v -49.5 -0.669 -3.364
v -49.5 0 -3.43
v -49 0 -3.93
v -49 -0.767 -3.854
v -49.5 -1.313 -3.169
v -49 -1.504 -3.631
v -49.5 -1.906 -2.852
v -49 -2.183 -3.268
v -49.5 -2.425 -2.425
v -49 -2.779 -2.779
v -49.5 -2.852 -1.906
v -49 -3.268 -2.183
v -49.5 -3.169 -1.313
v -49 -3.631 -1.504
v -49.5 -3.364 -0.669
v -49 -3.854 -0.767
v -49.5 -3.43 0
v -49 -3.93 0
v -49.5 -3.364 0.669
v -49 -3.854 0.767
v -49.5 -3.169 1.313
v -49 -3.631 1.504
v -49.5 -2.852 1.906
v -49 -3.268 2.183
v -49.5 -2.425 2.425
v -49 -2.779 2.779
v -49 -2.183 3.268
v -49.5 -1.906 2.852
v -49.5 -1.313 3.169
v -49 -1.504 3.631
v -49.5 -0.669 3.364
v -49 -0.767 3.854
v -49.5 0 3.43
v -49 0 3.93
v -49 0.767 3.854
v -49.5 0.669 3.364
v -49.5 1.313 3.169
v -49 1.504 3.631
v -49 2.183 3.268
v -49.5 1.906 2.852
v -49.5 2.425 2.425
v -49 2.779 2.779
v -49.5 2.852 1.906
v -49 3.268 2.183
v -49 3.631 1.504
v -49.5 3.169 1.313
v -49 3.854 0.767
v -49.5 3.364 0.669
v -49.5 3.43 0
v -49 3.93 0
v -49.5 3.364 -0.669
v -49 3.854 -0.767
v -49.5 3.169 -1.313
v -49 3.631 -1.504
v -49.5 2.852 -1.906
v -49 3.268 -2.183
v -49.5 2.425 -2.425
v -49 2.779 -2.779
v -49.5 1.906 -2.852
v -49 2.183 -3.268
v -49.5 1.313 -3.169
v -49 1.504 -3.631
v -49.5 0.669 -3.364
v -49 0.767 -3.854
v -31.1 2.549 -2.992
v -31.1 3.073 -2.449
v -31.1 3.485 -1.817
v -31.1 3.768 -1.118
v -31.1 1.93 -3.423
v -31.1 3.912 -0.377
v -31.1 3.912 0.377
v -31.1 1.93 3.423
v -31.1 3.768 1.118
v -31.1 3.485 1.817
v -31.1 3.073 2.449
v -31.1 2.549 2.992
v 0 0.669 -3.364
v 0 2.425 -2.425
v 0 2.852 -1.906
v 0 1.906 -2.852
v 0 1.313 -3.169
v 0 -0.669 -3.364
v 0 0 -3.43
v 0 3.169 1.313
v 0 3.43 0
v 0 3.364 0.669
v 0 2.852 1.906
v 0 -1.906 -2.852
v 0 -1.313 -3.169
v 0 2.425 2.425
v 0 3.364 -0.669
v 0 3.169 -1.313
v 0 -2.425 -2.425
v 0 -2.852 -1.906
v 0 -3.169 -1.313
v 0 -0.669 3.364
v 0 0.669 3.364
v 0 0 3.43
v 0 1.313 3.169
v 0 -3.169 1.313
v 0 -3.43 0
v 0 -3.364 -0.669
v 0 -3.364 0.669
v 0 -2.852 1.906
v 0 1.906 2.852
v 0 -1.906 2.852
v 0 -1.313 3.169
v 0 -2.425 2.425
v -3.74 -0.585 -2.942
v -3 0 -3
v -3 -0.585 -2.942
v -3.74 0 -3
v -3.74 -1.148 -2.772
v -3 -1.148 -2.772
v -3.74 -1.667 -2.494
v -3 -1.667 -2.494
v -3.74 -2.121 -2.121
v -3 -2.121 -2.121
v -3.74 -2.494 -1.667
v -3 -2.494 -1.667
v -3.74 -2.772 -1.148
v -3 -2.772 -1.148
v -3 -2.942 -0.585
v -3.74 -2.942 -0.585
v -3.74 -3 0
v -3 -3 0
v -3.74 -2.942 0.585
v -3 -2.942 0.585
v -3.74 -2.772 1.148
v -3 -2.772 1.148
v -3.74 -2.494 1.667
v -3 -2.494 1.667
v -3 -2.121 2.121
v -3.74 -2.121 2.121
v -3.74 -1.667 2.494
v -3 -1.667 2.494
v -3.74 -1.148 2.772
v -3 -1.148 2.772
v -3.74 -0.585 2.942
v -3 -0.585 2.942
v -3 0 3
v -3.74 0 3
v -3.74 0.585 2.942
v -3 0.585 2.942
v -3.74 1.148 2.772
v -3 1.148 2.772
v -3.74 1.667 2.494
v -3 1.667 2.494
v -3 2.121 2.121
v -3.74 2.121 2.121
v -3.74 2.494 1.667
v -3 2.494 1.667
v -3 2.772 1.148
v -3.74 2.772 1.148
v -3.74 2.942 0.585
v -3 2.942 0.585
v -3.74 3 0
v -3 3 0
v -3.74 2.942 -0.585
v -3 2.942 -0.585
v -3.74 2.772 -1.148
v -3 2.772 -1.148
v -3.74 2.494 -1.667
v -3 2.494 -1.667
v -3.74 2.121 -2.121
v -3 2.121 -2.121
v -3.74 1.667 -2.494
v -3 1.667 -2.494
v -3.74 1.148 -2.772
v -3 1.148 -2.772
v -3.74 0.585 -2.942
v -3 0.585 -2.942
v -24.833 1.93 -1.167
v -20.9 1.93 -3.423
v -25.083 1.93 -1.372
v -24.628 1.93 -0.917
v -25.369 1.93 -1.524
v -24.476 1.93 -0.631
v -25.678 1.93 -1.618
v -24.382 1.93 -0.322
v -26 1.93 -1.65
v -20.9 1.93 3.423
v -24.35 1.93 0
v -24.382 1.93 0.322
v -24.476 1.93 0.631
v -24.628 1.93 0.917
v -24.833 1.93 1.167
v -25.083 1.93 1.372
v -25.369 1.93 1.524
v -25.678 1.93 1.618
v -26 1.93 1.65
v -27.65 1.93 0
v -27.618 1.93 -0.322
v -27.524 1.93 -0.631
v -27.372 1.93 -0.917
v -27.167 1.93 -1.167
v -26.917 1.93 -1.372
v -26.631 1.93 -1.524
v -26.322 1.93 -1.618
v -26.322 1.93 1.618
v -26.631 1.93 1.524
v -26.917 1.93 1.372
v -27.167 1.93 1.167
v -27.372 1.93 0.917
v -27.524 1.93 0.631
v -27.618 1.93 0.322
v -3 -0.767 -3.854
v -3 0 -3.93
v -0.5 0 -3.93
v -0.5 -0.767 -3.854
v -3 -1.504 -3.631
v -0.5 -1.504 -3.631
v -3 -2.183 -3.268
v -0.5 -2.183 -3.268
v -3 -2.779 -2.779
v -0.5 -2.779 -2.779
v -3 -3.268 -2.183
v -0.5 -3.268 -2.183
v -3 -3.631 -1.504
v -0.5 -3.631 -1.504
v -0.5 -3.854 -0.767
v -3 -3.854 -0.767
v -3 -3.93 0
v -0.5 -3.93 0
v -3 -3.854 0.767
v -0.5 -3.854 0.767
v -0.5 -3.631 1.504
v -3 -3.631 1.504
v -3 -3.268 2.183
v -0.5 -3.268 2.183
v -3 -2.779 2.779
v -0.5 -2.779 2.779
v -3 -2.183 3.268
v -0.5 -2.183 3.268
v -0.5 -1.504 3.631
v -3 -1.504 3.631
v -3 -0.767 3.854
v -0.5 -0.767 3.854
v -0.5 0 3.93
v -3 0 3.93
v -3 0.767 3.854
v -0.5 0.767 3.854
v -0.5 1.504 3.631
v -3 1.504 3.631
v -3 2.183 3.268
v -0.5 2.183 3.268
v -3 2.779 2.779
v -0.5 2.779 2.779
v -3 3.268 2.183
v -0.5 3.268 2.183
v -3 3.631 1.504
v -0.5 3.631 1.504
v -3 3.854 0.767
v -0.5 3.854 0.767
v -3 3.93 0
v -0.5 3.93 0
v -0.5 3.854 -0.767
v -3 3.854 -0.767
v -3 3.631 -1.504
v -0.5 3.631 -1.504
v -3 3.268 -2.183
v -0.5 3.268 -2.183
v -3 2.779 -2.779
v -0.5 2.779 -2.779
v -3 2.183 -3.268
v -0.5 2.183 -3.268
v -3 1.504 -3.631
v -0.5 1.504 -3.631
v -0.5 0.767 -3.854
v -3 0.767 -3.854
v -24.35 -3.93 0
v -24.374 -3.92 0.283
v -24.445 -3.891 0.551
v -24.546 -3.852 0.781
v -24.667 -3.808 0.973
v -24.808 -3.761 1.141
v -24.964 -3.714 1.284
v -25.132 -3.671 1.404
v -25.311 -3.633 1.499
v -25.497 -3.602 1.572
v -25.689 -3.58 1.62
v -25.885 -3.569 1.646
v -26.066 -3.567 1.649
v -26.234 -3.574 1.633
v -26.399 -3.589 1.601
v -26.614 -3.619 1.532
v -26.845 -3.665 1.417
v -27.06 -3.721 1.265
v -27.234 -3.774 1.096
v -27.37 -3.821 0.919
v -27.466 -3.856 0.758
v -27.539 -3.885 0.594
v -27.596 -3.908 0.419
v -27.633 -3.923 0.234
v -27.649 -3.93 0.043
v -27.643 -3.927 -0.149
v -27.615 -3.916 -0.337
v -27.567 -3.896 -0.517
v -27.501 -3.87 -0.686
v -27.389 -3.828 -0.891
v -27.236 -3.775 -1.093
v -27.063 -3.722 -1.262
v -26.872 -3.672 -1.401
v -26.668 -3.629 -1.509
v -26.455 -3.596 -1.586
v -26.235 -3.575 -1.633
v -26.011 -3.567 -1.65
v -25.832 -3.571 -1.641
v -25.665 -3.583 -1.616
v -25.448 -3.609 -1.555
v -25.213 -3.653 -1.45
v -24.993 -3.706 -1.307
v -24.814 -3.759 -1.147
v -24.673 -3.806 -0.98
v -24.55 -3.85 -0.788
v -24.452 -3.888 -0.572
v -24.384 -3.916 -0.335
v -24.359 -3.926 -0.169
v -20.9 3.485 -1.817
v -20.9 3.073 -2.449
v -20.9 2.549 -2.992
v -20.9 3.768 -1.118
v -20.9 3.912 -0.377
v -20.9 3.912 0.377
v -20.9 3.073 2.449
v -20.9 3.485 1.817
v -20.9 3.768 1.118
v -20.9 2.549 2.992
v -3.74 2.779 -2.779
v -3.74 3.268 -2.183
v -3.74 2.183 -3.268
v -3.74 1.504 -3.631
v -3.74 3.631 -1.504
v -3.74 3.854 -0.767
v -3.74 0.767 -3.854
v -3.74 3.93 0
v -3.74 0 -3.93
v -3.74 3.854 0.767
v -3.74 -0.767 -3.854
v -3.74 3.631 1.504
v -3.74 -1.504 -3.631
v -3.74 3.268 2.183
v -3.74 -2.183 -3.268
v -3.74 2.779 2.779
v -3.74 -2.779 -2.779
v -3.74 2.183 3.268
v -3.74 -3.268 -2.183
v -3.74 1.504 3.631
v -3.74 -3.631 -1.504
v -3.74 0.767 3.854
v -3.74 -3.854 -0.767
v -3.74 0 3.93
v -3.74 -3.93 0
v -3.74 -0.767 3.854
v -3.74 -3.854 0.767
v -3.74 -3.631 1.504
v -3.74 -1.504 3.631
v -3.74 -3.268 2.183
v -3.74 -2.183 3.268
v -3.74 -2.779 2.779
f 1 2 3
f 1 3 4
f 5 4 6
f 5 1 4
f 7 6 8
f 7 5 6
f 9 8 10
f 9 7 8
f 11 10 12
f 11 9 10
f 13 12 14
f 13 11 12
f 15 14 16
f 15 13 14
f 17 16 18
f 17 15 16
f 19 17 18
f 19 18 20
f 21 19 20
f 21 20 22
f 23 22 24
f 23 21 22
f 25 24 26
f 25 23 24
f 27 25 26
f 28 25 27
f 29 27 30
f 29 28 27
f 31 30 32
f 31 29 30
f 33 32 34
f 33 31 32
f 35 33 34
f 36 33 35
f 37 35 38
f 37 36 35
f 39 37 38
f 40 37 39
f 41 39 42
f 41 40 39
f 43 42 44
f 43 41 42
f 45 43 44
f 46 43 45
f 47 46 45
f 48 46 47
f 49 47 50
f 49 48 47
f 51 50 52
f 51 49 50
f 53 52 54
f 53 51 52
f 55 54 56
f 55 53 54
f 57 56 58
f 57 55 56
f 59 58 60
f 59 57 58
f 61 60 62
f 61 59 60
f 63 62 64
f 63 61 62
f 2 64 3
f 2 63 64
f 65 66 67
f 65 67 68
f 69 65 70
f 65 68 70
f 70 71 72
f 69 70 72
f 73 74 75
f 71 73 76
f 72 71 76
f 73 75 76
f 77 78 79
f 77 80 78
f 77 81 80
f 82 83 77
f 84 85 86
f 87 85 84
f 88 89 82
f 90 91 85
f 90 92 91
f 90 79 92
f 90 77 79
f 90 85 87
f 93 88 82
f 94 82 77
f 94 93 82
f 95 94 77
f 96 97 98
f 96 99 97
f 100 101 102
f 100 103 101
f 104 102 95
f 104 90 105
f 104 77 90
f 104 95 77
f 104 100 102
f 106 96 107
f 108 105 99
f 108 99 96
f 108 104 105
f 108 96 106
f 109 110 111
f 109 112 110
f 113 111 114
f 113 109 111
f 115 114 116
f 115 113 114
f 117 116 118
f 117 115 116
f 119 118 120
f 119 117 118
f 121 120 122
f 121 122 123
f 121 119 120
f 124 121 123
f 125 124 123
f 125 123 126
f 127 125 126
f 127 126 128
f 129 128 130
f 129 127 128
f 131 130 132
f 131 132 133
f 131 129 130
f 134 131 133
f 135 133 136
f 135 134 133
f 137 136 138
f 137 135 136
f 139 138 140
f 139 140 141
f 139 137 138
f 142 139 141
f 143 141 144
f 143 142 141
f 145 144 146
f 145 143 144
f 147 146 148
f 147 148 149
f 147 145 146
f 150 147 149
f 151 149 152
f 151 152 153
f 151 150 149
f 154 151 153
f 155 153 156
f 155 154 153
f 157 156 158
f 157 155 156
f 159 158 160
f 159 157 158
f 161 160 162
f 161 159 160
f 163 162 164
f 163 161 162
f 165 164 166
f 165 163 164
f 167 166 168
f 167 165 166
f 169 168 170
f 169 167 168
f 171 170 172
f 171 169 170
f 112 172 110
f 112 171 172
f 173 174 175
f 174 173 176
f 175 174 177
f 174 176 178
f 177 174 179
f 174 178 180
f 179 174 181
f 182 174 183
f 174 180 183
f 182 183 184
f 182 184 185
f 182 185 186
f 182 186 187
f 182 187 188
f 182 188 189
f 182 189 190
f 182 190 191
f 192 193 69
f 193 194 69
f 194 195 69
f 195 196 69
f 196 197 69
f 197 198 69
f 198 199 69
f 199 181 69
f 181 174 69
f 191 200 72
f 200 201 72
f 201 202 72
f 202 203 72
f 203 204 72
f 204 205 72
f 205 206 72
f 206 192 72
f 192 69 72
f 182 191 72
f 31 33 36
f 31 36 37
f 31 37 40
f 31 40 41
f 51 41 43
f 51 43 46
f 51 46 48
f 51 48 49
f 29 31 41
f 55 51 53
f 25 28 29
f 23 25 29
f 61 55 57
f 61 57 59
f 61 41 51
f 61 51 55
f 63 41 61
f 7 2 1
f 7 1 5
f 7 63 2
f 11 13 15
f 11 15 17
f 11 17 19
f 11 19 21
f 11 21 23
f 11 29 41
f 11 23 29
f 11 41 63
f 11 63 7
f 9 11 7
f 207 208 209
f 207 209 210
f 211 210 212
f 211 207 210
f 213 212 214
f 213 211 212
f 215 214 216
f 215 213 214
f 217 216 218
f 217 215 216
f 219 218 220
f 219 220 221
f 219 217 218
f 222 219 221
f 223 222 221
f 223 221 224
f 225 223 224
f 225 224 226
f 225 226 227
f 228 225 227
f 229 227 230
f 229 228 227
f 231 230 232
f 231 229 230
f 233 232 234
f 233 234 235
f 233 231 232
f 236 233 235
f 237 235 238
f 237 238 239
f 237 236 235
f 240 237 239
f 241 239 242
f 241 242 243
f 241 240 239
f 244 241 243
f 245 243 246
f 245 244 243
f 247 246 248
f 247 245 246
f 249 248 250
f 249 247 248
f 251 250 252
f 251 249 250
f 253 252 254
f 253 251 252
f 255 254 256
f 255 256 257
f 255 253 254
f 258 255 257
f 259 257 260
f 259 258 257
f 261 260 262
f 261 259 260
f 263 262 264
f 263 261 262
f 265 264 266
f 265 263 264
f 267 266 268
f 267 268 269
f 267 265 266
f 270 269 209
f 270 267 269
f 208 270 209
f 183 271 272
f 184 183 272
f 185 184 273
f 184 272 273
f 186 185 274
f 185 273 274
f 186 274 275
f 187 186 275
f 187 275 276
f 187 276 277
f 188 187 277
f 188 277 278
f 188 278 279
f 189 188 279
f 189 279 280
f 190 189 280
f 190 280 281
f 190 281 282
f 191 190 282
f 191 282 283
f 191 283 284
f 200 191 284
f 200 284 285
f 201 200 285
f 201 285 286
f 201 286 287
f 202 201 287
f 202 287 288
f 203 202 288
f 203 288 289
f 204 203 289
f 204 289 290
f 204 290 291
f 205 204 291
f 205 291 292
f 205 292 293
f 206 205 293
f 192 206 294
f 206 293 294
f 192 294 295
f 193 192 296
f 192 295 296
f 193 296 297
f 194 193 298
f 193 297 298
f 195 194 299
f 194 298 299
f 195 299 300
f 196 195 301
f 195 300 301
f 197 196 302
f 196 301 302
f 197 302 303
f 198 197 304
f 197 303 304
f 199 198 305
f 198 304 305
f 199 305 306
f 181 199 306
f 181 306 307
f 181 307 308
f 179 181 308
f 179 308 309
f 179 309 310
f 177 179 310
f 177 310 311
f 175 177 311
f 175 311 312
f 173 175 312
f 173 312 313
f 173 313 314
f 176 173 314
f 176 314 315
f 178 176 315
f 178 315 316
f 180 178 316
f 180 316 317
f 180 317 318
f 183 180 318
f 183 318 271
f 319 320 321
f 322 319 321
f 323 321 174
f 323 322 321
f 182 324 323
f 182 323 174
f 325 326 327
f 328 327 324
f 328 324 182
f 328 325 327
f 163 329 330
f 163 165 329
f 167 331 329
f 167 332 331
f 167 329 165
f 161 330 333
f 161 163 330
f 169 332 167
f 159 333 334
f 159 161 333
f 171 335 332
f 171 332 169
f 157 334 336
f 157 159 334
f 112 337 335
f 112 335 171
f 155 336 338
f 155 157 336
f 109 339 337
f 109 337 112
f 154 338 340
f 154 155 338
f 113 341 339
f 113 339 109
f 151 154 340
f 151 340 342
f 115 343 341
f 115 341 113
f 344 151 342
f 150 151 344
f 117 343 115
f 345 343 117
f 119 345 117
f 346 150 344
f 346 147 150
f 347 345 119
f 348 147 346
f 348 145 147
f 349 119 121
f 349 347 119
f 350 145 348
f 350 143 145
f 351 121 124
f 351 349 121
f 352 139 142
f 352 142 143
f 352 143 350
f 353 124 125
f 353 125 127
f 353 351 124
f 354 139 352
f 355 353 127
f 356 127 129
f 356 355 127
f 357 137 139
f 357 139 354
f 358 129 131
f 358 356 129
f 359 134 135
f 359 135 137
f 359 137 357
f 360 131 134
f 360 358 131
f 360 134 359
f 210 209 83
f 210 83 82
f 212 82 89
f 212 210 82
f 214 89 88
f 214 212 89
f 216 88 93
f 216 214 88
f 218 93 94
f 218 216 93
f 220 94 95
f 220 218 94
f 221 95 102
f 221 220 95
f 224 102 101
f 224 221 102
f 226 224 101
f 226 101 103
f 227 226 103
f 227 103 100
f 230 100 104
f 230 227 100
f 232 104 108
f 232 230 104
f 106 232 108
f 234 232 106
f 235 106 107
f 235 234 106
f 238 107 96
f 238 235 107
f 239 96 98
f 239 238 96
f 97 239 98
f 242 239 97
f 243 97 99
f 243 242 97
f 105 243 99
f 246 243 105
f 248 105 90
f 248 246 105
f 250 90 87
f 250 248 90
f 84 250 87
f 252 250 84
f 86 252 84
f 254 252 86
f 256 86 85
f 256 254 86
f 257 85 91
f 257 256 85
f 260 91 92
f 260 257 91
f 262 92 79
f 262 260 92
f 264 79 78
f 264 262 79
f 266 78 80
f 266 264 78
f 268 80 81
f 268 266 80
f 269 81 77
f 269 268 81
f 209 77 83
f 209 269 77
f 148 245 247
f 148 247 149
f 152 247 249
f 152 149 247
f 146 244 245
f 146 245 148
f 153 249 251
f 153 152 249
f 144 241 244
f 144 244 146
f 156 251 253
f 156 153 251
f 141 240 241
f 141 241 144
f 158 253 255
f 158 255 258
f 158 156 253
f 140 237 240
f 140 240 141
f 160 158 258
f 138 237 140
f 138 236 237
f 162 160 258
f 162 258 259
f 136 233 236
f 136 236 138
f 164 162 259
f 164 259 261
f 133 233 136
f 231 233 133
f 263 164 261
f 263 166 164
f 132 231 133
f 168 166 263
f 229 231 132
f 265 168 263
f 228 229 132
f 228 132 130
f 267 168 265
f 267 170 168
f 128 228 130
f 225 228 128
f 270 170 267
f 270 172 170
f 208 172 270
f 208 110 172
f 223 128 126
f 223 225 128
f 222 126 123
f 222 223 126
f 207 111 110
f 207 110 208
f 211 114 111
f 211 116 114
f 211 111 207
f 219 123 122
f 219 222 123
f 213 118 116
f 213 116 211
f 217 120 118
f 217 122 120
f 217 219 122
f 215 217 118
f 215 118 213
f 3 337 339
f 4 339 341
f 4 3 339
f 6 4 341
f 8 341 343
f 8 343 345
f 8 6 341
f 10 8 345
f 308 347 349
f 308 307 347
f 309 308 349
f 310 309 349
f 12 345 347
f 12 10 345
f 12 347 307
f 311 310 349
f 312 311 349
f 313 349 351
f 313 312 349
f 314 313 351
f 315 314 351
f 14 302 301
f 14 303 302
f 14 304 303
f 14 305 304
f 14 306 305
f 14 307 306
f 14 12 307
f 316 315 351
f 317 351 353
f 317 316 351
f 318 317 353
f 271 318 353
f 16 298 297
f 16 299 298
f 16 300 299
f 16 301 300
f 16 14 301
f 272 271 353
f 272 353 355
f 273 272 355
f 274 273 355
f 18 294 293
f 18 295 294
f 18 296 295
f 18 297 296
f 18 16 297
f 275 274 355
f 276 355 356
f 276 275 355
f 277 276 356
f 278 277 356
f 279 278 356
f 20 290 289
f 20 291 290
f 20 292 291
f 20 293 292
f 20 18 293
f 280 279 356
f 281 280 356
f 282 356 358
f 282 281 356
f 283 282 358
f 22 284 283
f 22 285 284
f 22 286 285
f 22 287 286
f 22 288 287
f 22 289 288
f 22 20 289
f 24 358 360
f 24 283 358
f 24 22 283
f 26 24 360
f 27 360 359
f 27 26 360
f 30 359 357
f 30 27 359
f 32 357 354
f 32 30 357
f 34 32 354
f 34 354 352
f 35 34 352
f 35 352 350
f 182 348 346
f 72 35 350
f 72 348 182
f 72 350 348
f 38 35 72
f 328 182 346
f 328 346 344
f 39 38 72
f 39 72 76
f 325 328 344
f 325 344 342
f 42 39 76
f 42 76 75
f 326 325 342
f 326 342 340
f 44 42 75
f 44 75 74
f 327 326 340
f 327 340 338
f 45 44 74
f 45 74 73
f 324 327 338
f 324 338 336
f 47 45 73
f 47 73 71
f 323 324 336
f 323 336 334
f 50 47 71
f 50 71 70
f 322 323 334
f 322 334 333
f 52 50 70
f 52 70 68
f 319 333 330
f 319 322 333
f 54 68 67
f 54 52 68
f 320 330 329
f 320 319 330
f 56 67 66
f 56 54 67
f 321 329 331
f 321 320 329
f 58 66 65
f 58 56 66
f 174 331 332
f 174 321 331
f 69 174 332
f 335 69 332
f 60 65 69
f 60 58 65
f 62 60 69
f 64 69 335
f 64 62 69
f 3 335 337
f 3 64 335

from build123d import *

# Parameters (mm, degrees)
CHAFL_N1_SIZE             = 0.5
CORTAR_EXTRUIR1_DEPTH     = 10.2
TALADRO_ROSCADO_M4X0_71_D = 3.3


with BuildPart() as part:
    # Croquis1 → Revolución1 (revolve)
    with BuildSketch(Plane(origin=(0, 0, 0), x_dir=(0, 1, 0), z_dir=(0, 0, 1)), mode=Mode.PRIVATE) as revoluci_n1_sk:
        Polygon((0, 0), (3.93, 0), (3.93, 3), (3, 3), (3, 3.74), (3.93, 3.74), (3.93, 49.5), (0, 49.5), align=None)
    revolve(revoluci_n1_sk.sketch.rotate(Axis((0, 0, 0), (-1, 0, 0)), 90), axis=Axis((0, 0, 0), (-1, 0, 0)))

    # Chaflán1
    chafl_n1_edges = [part.edges().sort_by_distance(p)[0] for p in [
        (-49.5, 0, 3.93),
        (0, 0, 3.93),
    ]]
    chamfer(chafl_n1_edges, length=CHAFL_N1_SIZE)

    # Croquis2 → Cortar-Extruir1 (cut)
    with BuildSketch(Plane.ZY.offset(31.1)):
        with BuildLine():
            Line((-3.423448554, 1.93), (3.423448554, 1.93))
            ThreePointArc((3.423448554, 1.93), (0, 3.93), (-3.423448554, 1.93))
        make_face()
    extrude(amount=-CORTAR_EXTRUIR1_DEPTH, mode=Mode.SUBTRACT)

    # Taladro roscado M4x0.71 (through all)
    with Locations(Plane(origin=(0, 1.93, 0), x_dir=(-1, 0, 0), z_dir=(0, 1, 0))):
        with Locations((26, 0)):
            Hole(TALADRO_ROSCADO_M4X0_71_D / 2)


solid = part.part
